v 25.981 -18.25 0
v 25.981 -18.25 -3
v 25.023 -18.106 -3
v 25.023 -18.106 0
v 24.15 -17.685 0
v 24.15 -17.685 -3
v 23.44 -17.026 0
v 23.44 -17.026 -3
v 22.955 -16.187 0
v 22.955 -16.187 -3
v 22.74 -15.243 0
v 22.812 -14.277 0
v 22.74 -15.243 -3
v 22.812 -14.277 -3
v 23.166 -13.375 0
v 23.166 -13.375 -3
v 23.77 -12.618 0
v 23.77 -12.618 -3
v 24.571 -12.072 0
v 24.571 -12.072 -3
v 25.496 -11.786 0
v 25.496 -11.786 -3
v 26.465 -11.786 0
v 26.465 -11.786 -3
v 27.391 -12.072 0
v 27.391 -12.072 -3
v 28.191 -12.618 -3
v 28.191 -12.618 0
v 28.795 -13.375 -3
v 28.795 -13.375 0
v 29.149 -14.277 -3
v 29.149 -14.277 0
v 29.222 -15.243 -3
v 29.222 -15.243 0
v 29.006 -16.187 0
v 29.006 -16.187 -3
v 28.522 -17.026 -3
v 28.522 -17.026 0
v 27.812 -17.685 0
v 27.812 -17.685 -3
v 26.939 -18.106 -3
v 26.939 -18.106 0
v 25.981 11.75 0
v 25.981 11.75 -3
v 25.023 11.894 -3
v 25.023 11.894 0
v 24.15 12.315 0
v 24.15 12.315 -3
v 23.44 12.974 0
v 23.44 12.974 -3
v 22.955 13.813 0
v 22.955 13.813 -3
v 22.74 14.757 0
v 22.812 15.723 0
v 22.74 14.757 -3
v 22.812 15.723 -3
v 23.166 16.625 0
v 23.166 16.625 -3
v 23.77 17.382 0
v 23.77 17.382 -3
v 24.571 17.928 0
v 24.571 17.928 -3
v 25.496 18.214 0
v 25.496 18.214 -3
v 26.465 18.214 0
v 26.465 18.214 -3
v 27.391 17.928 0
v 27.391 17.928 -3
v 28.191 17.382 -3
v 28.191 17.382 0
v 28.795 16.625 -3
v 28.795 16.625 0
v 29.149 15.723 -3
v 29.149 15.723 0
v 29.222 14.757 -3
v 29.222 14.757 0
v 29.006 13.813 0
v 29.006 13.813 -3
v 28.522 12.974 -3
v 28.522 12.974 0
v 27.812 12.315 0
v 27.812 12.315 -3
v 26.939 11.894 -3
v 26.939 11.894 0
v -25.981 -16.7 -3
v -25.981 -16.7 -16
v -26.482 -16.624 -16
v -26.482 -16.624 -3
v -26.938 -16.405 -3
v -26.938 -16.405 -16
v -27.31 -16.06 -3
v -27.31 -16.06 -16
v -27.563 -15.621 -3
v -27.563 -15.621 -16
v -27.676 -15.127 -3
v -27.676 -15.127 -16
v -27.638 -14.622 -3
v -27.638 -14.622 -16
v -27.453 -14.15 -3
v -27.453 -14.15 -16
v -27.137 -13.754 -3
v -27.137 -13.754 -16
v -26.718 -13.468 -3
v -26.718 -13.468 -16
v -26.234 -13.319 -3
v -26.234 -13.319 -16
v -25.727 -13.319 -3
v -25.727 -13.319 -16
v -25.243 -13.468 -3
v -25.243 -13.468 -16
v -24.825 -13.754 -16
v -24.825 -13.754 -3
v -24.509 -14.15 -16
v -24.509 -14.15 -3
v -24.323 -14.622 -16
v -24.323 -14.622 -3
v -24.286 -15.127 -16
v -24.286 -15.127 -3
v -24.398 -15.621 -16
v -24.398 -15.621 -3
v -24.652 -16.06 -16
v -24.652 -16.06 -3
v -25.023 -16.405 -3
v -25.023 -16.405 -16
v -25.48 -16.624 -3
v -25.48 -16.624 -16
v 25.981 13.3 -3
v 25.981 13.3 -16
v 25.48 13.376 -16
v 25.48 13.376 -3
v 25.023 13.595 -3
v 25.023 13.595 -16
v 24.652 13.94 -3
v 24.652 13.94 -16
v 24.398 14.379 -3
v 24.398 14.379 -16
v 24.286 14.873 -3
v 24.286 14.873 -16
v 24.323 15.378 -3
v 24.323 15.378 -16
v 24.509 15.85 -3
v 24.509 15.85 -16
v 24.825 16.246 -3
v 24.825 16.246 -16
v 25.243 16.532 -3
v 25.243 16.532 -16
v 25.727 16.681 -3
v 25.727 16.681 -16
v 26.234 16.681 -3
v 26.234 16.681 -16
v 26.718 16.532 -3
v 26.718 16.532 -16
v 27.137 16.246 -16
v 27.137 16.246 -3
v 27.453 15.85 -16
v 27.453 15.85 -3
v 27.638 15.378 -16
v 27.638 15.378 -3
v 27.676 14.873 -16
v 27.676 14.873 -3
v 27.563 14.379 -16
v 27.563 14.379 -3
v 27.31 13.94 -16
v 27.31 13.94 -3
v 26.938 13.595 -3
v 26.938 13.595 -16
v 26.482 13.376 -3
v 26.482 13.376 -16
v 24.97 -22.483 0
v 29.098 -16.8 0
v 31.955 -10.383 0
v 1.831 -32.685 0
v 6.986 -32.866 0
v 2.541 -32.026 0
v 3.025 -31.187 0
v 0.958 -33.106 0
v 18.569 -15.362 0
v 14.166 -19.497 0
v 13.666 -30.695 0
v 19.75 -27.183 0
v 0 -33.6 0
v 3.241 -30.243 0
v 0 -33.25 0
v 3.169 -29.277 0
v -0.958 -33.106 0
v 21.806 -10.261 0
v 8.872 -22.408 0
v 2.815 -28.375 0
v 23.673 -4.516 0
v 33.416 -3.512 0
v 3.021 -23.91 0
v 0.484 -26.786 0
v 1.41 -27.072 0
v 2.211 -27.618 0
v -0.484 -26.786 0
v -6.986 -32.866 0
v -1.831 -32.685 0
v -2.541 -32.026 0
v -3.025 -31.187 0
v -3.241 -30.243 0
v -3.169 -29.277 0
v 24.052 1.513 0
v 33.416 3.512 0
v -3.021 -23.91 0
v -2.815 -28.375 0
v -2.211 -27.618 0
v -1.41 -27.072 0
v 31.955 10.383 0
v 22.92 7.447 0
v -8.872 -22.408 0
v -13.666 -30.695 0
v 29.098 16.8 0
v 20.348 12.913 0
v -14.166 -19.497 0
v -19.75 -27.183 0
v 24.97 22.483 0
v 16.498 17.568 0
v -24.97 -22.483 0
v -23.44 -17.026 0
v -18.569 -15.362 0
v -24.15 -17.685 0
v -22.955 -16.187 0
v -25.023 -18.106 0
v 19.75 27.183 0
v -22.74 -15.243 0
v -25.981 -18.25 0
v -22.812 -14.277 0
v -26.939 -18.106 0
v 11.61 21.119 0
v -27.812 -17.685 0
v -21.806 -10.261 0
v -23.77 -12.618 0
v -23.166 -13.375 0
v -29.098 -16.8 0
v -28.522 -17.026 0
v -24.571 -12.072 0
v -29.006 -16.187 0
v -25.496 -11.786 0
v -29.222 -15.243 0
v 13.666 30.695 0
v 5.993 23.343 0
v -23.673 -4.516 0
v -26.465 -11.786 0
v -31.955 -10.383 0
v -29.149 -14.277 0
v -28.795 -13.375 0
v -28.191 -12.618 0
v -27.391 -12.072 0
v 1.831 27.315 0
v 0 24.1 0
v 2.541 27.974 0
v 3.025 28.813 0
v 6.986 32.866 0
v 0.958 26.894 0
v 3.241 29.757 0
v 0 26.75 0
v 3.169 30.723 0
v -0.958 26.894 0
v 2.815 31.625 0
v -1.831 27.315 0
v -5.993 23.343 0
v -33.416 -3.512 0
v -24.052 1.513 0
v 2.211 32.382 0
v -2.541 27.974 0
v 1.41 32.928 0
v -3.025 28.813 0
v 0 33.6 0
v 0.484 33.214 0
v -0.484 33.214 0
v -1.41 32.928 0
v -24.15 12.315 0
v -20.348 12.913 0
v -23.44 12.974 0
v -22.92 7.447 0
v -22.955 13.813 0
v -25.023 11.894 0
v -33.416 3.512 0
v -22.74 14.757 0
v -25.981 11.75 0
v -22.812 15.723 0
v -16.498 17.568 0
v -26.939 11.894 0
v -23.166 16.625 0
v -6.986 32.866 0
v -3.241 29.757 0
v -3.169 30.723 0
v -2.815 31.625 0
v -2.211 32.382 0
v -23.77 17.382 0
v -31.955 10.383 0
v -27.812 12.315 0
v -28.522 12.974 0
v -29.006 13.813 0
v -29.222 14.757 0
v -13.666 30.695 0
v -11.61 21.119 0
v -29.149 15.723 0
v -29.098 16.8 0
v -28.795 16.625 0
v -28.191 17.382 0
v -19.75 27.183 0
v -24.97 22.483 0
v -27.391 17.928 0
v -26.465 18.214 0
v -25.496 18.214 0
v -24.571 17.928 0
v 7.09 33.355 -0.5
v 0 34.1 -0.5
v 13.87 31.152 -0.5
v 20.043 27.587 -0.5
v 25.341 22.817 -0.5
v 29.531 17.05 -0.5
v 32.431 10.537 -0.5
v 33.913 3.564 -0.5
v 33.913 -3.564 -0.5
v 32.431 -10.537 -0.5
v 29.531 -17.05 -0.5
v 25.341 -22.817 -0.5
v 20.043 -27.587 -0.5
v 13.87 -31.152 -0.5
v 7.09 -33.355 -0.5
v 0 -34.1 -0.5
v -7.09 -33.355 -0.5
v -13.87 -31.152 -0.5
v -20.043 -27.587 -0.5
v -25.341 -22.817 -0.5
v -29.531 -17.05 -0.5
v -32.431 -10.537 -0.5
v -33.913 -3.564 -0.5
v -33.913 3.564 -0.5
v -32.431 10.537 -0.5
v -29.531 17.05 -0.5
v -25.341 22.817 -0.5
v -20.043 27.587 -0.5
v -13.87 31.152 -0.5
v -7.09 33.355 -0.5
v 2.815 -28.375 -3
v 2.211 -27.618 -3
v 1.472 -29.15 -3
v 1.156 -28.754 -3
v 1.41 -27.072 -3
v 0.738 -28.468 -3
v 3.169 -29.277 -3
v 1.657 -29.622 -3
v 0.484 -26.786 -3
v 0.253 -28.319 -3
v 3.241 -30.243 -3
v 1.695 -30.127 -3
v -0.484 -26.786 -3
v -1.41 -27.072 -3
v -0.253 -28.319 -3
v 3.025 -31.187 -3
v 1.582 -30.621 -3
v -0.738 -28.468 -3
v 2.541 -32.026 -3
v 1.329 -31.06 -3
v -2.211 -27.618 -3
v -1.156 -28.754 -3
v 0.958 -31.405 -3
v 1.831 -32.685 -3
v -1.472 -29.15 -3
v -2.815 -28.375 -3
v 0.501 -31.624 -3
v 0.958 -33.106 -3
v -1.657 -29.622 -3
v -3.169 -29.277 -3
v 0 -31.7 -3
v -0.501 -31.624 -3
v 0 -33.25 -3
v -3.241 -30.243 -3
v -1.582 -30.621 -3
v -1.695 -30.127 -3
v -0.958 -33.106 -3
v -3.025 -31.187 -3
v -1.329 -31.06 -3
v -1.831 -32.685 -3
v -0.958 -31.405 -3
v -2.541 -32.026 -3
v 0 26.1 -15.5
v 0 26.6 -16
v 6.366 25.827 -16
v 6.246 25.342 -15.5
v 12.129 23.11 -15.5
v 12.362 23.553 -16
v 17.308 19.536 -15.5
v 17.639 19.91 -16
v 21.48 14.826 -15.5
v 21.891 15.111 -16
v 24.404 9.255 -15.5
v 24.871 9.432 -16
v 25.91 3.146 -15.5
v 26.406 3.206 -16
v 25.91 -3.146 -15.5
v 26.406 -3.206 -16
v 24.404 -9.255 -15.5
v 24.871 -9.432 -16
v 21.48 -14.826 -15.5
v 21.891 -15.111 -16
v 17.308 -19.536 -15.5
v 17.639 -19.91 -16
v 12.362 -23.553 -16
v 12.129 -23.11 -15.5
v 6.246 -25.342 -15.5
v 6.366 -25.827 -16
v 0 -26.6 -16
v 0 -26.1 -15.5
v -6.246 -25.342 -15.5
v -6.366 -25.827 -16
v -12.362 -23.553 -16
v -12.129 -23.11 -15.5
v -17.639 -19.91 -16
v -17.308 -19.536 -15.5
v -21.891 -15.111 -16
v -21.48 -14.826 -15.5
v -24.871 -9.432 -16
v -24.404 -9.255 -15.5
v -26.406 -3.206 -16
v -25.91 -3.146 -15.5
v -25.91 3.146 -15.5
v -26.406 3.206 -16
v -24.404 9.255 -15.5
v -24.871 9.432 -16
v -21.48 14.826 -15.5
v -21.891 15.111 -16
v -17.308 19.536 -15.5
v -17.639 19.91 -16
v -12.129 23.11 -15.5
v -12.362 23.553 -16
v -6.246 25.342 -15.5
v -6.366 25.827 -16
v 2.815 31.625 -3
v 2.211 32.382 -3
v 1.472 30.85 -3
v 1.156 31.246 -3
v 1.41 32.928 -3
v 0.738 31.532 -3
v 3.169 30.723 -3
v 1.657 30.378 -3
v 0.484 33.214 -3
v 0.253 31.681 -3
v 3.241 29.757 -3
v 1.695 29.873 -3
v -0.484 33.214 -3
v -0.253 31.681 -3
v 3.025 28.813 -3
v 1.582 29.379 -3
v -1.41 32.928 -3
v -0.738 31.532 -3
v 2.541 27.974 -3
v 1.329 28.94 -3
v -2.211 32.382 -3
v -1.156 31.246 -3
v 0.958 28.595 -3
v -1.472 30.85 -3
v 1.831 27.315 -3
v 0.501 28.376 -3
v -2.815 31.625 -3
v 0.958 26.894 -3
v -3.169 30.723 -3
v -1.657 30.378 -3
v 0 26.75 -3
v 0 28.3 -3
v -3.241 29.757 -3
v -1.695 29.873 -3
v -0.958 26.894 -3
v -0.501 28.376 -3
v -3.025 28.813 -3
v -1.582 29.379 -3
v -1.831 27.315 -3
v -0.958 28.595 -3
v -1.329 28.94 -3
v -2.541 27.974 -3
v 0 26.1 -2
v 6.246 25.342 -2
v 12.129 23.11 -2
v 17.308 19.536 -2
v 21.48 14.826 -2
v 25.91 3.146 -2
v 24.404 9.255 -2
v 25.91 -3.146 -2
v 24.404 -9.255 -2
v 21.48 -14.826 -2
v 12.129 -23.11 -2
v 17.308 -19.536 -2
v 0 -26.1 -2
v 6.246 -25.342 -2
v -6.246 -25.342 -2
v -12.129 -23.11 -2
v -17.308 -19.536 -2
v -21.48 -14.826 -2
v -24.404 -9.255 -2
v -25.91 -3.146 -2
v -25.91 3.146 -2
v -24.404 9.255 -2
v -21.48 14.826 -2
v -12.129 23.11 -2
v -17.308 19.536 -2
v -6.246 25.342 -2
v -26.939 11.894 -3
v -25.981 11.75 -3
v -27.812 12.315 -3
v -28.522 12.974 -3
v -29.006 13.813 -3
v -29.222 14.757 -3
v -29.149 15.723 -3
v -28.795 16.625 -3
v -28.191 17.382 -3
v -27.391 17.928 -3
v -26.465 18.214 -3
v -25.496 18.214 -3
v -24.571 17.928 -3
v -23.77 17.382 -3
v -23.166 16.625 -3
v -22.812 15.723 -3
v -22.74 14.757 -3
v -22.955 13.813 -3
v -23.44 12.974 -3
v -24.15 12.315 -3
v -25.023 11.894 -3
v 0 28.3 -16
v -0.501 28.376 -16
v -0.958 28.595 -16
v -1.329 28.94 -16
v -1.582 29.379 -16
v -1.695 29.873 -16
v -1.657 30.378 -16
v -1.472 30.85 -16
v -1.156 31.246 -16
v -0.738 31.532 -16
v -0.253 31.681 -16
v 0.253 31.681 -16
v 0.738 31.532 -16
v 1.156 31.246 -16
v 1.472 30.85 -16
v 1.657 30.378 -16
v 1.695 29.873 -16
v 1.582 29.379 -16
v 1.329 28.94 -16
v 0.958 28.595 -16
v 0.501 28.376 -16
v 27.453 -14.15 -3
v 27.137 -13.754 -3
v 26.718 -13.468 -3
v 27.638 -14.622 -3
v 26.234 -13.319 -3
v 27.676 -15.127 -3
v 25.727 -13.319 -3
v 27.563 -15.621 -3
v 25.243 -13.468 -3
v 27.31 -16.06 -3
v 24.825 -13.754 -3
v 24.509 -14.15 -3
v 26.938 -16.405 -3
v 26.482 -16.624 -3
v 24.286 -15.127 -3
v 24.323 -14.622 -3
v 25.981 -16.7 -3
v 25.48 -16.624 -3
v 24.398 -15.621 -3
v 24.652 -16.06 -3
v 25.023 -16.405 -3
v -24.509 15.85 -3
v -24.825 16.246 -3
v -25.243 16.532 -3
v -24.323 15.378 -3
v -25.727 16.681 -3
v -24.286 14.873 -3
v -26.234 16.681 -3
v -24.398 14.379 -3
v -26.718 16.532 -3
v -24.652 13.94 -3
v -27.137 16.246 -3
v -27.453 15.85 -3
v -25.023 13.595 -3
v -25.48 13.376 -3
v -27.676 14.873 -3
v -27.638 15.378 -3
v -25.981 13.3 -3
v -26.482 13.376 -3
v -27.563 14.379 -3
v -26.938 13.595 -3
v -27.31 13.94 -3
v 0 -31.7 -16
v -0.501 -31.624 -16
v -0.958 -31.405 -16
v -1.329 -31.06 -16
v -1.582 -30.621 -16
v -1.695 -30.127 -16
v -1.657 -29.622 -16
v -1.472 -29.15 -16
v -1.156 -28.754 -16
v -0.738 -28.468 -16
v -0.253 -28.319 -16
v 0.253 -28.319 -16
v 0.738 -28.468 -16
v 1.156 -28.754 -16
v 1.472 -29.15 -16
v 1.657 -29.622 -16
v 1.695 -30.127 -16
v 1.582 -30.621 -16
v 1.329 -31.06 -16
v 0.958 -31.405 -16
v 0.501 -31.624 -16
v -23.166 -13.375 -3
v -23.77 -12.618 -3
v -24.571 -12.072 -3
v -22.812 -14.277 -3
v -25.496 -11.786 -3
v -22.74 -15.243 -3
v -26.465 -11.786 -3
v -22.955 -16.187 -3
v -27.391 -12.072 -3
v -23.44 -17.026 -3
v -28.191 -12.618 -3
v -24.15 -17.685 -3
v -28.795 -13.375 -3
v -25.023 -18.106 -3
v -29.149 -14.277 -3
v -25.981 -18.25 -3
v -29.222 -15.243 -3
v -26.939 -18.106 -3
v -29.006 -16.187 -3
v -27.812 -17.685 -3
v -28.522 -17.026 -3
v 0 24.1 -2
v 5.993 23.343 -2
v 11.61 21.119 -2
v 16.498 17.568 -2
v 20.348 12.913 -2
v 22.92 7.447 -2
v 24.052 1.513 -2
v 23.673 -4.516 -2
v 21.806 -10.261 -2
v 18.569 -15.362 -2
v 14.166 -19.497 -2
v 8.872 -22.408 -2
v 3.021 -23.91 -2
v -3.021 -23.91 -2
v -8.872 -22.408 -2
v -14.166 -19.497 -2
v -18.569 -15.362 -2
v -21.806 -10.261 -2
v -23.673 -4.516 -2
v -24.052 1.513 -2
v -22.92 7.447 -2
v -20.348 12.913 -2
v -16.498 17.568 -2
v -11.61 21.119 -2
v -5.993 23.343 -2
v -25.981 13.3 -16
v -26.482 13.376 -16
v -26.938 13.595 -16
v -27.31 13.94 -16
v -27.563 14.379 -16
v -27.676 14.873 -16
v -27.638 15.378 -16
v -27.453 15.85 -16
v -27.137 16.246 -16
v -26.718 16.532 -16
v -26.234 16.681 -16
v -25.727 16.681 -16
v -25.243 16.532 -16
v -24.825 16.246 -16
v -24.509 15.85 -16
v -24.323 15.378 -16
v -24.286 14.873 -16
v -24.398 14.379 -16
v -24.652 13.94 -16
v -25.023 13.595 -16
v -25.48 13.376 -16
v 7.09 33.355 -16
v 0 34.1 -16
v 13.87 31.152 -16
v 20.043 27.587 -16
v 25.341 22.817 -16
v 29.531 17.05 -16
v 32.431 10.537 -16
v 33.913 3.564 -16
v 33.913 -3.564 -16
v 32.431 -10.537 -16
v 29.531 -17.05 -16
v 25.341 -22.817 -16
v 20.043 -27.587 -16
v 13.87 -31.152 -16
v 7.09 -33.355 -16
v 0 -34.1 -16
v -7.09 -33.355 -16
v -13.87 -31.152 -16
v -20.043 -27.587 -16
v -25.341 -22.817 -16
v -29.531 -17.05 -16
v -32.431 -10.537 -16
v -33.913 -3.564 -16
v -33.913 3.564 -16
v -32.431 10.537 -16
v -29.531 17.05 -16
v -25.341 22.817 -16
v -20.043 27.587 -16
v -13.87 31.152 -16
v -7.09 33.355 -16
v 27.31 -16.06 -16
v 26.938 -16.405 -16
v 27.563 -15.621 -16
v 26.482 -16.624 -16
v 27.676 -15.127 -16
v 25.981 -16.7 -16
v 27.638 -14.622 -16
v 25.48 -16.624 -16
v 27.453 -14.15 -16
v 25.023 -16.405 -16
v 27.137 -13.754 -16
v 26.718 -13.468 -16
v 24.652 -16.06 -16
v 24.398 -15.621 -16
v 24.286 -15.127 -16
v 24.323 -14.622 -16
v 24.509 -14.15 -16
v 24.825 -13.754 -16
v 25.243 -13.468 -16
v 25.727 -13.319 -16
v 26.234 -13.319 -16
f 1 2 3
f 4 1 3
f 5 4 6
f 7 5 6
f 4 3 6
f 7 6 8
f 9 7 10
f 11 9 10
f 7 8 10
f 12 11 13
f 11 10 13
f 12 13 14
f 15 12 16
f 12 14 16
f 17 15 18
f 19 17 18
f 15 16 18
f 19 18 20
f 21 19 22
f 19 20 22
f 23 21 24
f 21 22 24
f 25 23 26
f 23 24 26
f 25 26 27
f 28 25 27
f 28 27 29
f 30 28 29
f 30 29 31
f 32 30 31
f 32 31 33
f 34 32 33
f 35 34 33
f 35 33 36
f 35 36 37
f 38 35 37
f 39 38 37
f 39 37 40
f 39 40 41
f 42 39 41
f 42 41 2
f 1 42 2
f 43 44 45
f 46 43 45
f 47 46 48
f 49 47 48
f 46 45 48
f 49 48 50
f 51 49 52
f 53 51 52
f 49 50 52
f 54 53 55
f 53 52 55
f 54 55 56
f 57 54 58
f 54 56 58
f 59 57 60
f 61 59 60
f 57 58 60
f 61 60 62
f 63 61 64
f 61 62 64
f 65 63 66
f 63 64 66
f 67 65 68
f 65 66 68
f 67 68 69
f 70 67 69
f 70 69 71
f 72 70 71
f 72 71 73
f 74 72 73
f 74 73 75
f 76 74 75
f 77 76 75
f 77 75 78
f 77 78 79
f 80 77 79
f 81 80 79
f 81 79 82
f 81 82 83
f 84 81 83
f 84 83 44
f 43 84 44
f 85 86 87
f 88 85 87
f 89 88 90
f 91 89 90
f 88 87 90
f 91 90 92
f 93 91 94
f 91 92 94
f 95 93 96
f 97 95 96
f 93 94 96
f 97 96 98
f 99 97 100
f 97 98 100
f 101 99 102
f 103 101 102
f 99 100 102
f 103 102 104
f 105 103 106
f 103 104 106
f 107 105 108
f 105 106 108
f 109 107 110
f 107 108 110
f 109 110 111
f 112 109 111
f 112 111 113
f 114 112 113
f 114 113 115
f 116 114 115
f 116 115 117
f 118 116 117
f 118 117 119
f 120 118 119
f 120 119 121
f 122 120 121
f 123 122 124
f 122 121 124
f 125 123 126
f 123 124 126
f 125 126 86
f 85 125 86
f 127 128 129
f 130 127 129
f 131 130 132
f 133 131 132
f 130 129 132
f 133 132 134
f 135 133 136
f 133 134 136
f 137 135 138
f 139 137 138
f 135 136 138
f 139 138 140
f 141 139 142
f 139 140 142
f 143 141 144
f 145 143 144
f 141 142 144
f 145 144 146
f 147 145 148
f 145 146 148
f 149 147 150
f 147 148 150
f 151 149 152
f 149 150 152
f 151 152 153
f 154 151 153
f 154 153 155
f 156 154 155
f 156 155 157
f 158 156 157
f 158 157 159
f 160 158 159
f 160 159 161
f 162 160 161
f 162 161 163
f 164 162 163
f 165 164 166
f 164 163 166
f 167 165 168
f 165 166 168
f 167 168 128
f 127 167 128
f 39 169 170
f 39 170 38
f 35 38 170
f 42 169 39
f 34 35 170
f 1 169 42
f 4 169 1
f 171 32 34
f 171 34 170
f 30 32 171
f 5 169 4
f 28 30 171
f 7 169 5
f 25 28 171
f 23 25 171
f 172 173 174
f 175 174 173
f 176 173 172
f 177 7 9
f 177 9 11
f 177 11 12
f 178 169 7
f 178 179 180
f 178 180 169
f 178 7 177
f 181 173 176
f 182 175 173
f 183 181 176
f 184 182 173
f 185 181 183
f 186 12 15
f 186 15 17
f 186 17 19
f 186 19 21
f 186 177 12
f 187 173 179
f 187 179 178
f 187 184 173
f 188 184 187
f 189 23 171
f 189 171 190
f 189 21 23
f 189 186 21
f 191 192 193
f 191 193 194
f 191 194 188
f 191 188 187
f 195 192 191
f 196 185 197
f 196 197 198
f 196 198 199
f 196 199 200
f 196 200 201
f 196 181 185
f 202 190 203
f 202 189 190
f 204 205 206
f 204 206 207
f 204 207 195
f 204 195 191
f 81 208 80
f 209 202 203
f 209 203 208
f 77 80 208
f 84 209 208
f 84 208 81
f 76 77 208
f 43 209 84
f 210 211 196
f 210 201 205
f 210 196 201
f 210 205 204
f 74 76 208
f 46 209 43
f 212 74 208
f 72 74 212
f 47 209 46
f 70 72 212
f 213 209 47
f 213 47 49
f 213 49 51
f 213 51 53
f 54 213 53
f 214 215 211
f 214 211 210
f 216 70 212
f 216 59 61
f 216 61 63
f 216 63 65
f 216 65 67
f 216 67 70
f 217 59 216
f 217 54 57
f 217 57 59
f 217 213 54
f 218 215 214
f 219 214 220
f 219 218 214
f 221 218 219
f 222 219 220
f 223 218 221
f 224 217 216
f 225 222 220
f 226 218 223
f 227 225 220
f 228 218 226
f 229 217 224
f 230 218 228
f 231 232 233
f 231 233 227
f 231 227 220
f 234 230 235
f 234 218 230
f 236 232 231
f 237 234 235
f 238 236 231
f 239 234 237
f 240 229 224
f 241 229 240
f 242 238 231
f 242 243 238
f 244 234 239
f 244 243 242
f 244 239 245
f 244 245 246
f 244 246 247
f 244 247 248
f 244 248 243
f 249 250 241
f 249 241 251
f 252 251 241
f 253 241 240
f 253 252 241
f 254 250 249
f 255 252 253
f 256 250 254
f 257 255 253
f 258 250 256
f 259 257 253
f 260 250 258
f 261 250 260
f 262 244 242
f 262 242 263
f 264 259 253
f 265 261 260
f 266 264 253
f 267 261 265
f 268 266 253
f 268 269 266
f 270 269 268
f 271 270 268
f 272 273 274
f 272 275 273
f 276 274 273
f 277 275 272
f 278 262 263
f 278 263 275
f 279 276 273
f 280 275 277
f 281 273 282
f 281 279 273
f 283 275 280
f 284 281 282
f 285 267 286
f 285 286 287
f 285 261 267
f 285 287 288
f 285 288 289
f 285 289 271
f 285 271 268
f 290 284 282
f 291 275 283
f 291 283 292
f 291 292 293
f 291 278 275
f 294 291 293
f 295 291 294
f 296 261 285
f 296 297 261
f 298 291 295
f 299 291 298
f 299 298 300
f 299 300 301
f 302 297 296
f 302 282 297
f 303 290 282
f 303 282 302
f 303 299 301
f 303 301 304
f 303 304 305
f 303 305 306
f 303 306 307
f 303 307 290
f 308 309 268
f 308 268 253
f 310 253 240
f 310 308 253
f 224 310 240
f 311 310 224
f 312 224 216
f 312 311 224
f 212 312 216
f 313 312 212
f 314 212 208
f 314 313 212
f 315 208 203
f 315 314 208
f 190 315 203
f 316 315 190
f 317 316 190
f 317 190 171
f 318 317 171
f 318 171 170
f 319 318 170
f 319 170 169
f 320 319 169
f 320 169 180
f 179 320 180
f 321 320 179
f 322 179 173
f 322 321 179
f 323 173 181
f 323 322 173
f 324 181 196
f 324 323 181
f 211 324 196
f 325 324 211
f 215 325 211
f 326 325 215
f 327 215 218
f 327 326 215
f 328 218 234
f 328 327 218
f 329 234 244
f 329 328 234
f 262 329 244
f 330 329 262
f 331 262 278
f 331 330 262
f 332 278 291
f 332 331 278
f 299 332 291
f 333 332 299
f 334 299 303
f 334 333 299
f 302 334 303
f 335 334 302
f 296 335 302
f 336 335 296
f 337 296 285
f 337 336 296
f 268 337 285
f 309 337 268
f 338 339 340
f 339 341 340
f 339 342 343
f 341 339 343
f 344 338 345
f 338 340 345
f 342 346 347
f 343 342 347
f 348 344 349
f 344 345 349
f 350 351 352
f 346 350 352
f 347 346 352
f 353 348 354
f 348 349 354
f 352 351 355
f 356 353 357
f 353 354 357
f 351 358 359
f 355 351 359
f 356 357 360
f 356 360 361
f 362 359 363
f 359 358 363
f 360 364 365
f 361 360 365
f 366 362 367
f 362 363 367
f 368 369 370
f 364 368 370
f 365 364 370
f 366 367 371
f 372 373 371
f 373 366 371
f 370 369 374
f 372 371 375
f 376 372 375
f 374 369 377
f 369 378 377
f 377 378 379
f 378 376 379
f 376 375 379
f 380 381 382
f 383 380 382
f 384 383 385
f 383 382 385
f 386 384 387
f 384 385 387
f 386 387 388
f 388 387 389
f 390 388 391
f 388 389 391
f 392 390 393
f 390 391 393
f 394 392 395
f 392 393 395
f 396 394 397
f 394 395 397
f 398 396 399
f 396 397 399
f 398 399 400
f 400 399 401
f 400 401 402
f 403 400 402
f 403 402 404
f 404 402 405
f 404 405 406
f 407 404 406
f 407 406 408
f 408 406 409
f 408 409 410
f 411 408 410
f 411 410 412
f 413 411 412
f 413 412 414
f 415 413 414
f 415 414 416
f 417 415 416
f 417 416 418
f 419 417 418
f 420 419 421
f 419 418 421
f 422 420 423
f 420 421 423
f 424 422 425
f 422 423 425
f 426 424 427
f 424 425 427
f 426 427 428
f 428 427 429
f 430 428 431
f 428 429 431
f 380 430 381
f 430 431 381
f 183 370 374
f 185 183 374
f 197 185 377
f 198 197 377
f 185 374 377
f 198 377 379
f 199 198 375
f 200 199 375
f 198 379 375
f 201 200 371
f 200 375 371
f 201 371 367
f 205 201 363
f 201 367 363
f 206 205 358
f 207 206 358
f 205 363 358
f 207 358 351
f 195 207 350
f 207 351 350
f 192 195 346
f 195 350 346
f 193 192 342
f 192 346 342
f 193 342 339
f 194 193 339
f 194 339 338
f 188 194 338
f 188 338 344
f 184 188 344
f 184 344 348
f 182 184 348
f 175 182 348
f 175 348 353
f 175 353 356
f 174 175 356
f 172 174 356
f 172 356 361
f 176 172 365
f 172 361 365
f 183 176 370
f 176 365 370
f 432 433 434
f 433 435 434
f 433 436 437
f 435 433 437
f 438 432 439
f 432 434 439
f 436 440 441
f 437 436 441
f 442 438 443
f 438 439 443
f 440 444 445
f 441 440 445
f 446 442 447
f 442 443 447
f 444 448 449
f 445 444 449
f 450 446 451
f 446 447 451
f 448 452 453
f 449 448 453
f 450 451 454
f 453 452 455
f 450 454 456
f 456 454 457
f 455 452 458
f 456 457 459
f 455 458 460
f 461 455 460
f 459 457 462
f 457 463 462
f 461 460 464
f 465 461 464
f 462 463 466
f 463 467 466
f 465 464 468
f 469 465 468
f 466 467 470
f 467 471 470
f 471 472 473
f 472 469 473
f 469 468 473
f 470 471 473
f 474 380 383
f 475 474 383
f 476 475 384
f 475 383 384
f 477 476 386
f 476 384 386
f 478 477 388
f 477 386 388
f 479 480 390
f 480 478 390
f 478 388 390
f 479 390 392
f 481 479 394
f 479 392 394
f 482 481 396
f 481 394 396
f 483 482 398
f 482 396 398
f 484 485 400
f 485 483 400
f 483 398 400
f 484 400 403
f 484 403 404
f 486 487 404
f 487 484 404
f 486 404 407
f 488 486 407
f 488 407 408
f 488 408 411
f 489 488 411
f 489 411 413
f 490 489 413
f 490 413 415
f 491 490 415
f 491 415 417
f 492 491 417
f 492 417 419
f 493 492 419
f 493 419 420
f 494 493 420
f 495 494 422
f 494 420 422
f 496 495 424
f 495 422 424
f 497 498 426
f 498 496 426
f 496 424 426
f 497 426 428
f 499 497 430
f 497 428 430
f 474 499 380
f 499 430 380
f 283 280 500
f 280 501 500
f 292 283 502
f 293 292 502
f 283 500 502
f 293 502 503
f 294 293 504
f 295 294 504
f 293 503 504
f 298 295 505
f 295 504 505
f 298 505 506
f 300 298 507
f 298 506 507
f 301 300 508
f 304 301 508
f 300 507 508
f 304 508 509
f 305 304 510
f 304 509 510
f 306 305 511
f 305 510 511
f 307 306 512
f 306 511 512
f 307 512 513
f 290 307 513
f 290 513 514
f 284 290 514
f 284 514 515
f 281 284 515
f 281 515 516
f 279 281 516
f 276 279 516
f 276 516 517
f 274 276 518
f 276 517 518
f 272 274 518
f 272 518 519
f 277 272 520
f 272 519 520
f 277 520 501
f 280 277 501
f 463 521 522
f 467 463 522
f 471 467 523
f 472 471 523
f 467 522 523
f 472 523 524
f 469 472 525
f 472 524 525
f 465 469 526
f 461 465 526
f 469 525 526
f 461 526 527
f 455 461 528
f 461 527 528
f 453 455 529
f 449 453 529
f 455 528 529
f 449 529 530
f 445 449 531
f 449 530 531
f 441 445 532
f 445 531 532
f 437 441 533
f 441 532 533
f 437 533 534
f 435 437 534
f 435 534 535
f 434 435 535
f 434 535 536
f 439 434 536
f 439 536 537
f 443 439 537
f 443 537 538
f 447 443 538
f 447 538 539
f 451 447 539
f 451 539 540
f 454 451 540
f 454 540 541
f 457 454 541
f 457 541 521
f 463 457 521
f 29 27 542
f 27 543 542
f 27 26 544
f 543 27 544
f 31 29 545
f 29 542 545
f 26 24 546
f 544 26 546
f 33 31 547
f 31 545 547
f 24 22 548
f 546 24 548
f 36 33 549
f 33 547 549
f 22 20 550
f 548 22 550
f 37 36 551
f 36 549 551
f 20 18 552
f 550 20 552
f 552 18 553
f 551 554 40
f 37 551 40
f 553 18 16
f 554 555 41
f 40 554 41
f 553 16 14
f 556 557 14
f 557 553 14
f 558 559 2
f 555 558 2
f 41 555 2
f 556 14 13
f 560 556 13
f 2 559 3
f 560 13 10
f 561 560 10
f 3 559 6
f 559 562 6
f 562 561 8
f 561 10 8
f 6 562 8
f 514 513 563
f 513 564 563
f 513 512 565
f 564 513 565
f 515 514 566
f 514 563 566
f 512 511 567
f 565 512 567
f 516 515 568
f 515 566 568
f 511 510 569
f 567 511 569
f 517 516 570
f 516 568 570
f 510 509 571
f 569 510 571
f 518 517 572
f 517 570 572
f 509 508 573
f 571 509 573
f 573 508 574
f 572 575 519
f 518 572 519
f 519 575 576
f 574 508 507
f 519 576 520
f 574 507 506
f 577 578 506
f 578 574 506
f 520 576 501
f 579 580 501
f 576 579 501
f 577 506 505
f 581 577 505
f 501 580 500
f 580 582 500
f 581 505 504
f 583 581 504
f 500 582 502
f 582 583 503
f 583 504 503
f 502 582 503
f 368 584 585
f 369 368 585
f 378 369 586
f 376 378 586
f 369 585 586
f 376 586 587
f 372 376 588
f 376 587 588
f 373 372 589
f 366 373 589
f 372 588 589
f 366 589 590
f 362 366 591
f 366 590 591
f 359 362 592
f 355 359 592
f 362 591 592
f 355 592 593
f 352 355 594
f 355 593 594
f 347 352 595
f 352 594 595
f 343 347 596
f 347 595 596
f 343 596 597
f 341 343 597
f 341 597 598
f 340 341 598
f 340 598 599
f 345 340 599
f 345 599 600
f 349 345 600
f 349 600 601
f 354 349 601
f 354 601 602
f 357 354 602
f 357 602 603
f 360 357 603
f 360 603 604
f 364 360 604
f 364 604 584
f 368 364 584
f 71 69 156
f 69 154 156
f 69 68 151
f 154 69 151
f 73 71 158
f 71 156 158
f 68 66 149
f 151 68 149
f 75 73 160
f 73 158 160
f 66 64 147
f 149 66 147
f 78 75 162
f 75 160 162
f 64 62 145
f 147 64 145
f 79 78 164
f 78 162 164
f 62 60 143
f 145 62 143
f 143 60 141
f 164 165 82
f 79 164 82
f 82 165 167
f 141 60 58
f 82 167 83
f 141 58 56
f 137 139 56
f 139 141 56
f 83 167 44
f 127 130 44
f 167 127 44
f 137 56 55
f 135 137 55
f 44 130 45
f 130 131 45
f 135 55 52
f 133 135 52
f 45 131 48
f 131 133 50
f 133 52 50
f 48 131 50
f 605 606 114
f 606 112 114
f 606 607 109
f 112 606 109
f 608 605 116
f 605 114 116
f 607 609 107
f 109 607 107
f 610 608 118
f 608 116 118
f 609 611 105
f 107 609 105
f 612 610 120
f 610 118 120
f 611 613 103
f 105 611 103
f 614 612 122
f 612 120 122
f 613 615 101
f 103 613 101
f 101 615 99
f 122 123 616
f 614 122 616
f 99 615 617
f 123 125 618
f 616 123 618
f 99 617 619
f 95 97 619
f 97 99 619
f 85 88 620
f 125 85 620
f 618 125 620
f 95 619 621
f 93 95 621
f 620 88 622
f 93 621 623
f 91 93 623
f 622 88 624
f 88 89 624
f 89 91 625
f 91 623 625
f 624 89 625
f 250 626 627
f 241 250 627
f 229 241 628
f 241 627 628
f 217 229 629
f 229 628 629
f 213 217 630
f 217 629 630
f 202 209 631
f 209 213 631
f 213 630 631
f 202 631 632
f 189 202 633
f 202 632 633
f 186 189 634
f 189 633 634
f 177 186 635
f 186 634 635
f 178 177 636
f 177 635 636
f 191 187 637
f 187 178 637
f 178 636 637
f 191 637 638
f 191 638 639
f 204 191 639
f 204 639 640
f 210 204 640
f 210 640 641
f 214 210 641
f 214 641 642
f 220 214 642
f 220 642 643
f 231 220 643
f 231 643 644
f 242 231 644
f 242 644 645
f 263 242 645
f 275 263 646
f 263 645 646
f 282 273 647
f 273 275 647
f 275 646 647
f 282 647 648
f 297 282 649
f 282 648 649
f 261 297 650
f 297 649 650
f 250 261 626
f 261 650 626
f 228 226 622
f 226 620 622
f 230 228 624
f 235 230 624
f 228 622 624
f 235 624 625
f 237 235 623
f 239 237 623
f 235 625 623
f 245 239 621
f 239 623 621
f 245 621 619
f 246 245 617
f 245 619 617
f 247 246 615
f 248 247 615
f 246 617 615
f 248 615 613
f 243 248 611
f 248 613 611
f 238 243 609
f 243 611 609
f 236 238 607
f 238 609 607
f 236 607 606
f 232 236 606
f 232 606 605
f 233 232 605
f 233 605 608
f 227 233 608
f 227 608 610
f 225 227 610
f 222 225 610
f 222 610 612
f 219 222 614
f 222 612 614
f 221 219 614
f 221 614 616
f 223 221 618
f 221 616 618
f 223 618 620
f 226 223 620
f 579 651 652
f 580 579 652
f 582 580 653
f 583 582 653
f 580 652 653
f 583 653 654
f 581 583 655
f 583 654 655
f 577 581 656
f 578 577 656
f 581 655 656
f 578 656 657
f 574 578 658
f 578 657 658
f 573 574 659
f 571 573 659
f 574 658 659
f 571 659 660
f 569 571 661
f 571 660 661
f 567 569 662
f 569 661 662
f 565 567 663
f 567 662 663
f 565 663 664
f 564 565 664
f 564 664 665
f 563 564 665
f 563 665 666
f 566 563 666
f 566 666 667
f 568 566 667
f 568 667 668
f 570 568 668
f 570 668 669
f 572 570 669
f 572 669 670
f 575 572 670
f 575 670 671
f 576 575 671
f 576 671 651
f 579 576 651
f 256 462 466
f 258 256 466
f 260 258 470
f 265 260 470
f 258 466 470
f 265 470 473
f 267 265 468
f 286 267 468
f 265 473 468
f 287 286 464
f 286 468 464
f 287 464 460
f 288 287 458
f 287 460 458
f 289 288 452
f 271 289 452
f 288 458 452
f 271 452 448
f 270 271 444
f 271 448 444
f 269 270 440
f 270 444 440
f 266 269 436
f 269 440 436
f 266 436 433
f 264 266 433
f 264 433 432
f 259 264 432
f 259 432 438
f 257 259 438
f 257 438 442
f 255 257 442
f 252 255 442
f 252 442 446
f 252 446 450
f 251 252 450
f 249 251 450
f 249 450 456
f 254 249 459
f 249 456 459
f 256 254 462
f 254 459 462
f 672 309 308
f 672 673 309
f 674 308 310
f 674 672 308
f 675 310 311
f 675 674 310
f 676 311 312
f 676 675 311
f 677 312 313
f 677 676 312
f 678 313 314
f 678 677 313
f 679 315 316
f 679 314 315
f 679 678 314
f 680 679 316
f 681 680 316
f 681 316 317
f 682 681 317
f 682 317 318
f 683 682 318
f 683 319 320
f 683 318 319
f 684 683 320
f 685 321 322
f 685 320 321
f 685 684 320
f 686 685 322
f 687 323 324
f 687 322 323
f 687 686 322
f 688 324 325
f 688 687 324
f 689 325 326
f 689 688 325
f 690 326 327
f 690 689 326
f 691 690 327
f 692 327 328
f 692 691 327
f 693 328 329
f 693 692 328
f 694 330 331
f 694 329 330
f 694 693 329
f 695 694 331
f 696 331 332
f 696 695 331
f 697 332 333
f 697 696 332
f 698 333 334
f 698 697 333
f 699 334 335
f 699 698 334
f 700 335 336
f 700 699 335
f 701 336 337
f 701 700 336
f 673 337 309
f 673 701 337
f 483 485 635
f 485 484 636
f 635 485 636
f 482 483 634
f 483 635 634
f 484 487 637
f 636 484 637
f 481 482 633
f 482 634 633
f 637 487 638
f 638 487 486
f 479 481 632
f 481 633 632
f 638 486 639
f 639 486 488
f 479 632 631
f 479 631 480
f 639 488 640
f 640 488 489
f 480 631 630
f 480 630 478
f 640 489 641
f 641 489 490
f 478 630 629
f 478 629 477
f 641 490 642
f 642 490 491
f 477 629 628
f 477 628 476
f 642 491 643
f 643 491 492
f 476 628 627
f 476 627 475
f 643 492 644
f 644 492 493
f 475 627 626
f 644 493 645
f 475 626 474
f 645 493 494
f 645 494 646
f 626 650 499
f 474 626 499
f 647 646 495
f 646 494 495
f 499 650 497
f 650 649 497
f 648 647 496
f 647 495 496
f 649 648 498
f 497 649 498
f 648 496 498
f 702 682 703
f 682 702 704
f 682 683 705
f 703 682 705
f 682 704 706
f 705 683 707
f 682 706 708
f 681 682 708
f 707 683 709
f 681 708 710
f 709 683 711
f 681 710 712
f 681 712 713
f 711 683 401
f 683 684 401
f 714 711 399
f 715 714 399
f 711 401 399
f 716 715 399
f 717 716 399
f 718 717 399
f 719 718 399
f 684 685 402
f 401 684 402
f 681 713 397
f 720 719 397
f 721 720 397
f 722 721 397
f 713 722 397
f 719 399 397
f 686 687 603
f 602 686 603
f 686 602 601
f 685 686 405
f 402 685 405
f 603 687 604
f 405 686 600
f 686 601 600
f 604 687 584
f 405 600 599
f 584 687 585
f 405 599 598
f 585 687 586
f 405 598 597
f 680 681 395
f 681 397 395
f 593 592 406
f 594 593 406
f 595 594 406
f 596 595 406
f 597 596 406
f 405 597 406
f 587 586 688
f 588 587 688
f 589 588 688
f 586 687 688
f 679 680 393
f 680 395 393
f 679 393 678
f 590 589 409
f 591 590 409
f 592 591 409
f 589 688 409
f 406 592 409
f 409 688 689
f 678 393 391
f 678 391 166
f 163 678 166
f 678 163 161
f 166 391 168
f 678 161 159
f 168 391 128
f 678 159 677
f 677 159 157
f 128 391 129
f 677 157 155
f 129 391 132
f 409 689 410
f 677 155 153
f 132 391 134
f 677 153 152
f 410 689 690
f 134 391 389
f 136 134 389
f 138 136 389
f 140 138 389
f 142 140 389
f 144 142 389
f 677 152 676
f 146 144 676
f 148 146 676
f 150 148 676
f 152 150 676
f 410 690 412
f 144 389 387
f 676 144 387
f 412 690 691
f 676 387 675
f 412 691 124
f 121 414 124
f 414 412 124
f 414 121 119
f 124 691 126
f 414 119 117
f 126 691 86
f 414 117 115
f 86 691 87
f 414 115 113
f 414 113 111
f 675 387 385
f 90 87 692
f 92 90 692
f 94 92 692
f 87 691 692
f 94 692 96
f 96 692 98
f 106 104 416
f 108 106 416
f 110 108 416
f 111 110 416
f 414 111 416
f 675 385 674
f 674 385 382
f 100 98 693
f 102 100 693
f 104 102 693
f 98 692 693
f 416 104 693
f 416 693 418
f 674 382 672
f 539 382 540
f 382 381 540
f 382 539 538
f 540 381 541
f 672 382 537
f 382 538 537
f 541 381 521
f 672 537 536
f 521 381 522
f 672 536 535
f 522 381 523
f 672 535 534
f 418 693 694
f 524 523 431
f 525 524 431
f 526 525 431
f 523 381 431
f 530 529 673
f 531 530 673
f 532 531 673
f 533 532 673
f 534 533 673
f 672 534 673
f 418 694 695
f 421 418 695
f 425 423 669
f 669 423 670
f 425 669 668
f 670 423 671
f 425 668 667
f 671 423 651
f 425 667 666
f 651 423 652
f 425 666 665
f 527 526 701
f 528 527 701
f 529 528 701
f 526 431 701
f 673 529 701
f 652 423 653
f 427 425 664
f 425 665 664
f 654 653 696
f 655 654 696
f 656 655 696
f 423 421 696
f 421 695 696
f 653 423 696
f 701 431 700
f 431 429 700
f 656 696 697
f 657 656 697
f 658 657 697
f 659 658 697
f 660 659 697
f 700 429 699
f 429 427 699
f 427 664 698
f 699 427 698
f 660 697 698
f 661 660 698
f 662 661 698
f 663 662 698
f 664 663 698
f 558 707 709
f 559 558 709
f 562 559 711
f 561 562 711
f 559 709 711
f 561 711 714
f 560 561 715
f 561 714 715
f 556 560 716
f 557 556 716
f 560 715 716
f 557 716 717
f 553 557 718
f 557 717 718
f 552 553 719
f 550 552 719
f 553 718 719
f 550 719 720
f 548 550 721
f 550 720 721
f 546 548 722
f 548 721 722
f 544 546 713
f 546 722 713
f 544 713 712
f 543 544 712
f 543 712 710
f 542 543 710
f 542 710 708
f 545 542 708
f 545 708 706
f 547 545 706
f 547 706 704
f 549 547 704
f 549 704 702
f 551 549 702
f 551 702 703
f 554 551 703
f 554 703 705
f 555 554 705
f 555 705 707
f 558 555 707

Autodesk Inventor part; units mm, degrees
ref_plane "YZ Plane" through (0, 0, 0) normal (1, 0, 0) x (0, 1, 0)
ref_plane "XZ Plane" through (0, 0, 0) normal (0, 1, 0) x (-1, 0, 0)
ref_plane "XY Plane" through (0, 0, 0) normal (0, 0, 1) x (1, 0, 0)
sketch "スケッチ2" plane through (0, 0, 0) normal (1, 0, 0) x (0, 1, 0)
  line L0 (0, 0) -> (26.1, 0)
  line L1 (26.1, 0) -> (26.1, -16)
  line L2 (26.1, -16) -> (0, -16)
  line L3 (0, -16) -> (0, 0)
  line L4 (0, 0) -> (34.1, 0)
  line L5 (34.1, 0) -> (34.1, -16)
  line L6 (34.1, -16) -> (0, -16)
  line L7 (0, -16) -> (0, 0)
  line L8 (34.1, 0) -> (21, 0)
  line L9 (26.1, 0) -> (24.1, 0)
  line L10 (24.1, 0) -> (24.1, -2)
  line L11 (24.1, -2) -> (26.1, -2)
  line L12 (26.1, -2) -> (26.1, 0)
  point P0 (26.1, 0)
  point P1 (24.1, 0)
  dimension "d1" = 26.1
  dimension "d8" = 2
  dimension "d10" = 14
  dimension "d27" = 8
  dimension "d31" = 2
revolve "回転1" add sketch "スケッチ2" angle 360 about axis through (0, 0, -16) along (0, 0, 1) contours L0 L1 L11 L10 | L1 L4 L5 L6
sketch "スケッチ4" plane through (0, 0, 0) normal (0, 0, 1) x (1, 0, 0)
  point P0 (0, 0)
  point P1 (0, 30)
  point P2 (-25.9808, 15)
  point P3 (-25.9808, -15)
  point P4 (0, -30)
  point P5 (25.9808, -15)
  point P6 (25.9808, 15)
  dimension "d11" = 30
  dimension "d14" = 360
hole "穴1" at (0, 30, 0) at (-25.9808, 15, 0) at (-25.9808, -15, 0) at (0, -30, 0) at (25.9808, -15, 0) at (25.9808, 15, 0) direction (0, 0, -1) diameter 3.4 end through all counterbore diameter 6.5 counterbore depth 3 clearance for "Socket Head Cap Screw" size "M3" standard "Ansi Metric M Profile"
chamfer "面取り1" distance 0.5 angle 45 1 edges at (0, -26.1, -16)
chamfer "面取り2" distance 0.5 angle 45 1 edges at (0, -34.1, 0)
properties part number "bearing_cover_j5" material "ABS プラスチック"
